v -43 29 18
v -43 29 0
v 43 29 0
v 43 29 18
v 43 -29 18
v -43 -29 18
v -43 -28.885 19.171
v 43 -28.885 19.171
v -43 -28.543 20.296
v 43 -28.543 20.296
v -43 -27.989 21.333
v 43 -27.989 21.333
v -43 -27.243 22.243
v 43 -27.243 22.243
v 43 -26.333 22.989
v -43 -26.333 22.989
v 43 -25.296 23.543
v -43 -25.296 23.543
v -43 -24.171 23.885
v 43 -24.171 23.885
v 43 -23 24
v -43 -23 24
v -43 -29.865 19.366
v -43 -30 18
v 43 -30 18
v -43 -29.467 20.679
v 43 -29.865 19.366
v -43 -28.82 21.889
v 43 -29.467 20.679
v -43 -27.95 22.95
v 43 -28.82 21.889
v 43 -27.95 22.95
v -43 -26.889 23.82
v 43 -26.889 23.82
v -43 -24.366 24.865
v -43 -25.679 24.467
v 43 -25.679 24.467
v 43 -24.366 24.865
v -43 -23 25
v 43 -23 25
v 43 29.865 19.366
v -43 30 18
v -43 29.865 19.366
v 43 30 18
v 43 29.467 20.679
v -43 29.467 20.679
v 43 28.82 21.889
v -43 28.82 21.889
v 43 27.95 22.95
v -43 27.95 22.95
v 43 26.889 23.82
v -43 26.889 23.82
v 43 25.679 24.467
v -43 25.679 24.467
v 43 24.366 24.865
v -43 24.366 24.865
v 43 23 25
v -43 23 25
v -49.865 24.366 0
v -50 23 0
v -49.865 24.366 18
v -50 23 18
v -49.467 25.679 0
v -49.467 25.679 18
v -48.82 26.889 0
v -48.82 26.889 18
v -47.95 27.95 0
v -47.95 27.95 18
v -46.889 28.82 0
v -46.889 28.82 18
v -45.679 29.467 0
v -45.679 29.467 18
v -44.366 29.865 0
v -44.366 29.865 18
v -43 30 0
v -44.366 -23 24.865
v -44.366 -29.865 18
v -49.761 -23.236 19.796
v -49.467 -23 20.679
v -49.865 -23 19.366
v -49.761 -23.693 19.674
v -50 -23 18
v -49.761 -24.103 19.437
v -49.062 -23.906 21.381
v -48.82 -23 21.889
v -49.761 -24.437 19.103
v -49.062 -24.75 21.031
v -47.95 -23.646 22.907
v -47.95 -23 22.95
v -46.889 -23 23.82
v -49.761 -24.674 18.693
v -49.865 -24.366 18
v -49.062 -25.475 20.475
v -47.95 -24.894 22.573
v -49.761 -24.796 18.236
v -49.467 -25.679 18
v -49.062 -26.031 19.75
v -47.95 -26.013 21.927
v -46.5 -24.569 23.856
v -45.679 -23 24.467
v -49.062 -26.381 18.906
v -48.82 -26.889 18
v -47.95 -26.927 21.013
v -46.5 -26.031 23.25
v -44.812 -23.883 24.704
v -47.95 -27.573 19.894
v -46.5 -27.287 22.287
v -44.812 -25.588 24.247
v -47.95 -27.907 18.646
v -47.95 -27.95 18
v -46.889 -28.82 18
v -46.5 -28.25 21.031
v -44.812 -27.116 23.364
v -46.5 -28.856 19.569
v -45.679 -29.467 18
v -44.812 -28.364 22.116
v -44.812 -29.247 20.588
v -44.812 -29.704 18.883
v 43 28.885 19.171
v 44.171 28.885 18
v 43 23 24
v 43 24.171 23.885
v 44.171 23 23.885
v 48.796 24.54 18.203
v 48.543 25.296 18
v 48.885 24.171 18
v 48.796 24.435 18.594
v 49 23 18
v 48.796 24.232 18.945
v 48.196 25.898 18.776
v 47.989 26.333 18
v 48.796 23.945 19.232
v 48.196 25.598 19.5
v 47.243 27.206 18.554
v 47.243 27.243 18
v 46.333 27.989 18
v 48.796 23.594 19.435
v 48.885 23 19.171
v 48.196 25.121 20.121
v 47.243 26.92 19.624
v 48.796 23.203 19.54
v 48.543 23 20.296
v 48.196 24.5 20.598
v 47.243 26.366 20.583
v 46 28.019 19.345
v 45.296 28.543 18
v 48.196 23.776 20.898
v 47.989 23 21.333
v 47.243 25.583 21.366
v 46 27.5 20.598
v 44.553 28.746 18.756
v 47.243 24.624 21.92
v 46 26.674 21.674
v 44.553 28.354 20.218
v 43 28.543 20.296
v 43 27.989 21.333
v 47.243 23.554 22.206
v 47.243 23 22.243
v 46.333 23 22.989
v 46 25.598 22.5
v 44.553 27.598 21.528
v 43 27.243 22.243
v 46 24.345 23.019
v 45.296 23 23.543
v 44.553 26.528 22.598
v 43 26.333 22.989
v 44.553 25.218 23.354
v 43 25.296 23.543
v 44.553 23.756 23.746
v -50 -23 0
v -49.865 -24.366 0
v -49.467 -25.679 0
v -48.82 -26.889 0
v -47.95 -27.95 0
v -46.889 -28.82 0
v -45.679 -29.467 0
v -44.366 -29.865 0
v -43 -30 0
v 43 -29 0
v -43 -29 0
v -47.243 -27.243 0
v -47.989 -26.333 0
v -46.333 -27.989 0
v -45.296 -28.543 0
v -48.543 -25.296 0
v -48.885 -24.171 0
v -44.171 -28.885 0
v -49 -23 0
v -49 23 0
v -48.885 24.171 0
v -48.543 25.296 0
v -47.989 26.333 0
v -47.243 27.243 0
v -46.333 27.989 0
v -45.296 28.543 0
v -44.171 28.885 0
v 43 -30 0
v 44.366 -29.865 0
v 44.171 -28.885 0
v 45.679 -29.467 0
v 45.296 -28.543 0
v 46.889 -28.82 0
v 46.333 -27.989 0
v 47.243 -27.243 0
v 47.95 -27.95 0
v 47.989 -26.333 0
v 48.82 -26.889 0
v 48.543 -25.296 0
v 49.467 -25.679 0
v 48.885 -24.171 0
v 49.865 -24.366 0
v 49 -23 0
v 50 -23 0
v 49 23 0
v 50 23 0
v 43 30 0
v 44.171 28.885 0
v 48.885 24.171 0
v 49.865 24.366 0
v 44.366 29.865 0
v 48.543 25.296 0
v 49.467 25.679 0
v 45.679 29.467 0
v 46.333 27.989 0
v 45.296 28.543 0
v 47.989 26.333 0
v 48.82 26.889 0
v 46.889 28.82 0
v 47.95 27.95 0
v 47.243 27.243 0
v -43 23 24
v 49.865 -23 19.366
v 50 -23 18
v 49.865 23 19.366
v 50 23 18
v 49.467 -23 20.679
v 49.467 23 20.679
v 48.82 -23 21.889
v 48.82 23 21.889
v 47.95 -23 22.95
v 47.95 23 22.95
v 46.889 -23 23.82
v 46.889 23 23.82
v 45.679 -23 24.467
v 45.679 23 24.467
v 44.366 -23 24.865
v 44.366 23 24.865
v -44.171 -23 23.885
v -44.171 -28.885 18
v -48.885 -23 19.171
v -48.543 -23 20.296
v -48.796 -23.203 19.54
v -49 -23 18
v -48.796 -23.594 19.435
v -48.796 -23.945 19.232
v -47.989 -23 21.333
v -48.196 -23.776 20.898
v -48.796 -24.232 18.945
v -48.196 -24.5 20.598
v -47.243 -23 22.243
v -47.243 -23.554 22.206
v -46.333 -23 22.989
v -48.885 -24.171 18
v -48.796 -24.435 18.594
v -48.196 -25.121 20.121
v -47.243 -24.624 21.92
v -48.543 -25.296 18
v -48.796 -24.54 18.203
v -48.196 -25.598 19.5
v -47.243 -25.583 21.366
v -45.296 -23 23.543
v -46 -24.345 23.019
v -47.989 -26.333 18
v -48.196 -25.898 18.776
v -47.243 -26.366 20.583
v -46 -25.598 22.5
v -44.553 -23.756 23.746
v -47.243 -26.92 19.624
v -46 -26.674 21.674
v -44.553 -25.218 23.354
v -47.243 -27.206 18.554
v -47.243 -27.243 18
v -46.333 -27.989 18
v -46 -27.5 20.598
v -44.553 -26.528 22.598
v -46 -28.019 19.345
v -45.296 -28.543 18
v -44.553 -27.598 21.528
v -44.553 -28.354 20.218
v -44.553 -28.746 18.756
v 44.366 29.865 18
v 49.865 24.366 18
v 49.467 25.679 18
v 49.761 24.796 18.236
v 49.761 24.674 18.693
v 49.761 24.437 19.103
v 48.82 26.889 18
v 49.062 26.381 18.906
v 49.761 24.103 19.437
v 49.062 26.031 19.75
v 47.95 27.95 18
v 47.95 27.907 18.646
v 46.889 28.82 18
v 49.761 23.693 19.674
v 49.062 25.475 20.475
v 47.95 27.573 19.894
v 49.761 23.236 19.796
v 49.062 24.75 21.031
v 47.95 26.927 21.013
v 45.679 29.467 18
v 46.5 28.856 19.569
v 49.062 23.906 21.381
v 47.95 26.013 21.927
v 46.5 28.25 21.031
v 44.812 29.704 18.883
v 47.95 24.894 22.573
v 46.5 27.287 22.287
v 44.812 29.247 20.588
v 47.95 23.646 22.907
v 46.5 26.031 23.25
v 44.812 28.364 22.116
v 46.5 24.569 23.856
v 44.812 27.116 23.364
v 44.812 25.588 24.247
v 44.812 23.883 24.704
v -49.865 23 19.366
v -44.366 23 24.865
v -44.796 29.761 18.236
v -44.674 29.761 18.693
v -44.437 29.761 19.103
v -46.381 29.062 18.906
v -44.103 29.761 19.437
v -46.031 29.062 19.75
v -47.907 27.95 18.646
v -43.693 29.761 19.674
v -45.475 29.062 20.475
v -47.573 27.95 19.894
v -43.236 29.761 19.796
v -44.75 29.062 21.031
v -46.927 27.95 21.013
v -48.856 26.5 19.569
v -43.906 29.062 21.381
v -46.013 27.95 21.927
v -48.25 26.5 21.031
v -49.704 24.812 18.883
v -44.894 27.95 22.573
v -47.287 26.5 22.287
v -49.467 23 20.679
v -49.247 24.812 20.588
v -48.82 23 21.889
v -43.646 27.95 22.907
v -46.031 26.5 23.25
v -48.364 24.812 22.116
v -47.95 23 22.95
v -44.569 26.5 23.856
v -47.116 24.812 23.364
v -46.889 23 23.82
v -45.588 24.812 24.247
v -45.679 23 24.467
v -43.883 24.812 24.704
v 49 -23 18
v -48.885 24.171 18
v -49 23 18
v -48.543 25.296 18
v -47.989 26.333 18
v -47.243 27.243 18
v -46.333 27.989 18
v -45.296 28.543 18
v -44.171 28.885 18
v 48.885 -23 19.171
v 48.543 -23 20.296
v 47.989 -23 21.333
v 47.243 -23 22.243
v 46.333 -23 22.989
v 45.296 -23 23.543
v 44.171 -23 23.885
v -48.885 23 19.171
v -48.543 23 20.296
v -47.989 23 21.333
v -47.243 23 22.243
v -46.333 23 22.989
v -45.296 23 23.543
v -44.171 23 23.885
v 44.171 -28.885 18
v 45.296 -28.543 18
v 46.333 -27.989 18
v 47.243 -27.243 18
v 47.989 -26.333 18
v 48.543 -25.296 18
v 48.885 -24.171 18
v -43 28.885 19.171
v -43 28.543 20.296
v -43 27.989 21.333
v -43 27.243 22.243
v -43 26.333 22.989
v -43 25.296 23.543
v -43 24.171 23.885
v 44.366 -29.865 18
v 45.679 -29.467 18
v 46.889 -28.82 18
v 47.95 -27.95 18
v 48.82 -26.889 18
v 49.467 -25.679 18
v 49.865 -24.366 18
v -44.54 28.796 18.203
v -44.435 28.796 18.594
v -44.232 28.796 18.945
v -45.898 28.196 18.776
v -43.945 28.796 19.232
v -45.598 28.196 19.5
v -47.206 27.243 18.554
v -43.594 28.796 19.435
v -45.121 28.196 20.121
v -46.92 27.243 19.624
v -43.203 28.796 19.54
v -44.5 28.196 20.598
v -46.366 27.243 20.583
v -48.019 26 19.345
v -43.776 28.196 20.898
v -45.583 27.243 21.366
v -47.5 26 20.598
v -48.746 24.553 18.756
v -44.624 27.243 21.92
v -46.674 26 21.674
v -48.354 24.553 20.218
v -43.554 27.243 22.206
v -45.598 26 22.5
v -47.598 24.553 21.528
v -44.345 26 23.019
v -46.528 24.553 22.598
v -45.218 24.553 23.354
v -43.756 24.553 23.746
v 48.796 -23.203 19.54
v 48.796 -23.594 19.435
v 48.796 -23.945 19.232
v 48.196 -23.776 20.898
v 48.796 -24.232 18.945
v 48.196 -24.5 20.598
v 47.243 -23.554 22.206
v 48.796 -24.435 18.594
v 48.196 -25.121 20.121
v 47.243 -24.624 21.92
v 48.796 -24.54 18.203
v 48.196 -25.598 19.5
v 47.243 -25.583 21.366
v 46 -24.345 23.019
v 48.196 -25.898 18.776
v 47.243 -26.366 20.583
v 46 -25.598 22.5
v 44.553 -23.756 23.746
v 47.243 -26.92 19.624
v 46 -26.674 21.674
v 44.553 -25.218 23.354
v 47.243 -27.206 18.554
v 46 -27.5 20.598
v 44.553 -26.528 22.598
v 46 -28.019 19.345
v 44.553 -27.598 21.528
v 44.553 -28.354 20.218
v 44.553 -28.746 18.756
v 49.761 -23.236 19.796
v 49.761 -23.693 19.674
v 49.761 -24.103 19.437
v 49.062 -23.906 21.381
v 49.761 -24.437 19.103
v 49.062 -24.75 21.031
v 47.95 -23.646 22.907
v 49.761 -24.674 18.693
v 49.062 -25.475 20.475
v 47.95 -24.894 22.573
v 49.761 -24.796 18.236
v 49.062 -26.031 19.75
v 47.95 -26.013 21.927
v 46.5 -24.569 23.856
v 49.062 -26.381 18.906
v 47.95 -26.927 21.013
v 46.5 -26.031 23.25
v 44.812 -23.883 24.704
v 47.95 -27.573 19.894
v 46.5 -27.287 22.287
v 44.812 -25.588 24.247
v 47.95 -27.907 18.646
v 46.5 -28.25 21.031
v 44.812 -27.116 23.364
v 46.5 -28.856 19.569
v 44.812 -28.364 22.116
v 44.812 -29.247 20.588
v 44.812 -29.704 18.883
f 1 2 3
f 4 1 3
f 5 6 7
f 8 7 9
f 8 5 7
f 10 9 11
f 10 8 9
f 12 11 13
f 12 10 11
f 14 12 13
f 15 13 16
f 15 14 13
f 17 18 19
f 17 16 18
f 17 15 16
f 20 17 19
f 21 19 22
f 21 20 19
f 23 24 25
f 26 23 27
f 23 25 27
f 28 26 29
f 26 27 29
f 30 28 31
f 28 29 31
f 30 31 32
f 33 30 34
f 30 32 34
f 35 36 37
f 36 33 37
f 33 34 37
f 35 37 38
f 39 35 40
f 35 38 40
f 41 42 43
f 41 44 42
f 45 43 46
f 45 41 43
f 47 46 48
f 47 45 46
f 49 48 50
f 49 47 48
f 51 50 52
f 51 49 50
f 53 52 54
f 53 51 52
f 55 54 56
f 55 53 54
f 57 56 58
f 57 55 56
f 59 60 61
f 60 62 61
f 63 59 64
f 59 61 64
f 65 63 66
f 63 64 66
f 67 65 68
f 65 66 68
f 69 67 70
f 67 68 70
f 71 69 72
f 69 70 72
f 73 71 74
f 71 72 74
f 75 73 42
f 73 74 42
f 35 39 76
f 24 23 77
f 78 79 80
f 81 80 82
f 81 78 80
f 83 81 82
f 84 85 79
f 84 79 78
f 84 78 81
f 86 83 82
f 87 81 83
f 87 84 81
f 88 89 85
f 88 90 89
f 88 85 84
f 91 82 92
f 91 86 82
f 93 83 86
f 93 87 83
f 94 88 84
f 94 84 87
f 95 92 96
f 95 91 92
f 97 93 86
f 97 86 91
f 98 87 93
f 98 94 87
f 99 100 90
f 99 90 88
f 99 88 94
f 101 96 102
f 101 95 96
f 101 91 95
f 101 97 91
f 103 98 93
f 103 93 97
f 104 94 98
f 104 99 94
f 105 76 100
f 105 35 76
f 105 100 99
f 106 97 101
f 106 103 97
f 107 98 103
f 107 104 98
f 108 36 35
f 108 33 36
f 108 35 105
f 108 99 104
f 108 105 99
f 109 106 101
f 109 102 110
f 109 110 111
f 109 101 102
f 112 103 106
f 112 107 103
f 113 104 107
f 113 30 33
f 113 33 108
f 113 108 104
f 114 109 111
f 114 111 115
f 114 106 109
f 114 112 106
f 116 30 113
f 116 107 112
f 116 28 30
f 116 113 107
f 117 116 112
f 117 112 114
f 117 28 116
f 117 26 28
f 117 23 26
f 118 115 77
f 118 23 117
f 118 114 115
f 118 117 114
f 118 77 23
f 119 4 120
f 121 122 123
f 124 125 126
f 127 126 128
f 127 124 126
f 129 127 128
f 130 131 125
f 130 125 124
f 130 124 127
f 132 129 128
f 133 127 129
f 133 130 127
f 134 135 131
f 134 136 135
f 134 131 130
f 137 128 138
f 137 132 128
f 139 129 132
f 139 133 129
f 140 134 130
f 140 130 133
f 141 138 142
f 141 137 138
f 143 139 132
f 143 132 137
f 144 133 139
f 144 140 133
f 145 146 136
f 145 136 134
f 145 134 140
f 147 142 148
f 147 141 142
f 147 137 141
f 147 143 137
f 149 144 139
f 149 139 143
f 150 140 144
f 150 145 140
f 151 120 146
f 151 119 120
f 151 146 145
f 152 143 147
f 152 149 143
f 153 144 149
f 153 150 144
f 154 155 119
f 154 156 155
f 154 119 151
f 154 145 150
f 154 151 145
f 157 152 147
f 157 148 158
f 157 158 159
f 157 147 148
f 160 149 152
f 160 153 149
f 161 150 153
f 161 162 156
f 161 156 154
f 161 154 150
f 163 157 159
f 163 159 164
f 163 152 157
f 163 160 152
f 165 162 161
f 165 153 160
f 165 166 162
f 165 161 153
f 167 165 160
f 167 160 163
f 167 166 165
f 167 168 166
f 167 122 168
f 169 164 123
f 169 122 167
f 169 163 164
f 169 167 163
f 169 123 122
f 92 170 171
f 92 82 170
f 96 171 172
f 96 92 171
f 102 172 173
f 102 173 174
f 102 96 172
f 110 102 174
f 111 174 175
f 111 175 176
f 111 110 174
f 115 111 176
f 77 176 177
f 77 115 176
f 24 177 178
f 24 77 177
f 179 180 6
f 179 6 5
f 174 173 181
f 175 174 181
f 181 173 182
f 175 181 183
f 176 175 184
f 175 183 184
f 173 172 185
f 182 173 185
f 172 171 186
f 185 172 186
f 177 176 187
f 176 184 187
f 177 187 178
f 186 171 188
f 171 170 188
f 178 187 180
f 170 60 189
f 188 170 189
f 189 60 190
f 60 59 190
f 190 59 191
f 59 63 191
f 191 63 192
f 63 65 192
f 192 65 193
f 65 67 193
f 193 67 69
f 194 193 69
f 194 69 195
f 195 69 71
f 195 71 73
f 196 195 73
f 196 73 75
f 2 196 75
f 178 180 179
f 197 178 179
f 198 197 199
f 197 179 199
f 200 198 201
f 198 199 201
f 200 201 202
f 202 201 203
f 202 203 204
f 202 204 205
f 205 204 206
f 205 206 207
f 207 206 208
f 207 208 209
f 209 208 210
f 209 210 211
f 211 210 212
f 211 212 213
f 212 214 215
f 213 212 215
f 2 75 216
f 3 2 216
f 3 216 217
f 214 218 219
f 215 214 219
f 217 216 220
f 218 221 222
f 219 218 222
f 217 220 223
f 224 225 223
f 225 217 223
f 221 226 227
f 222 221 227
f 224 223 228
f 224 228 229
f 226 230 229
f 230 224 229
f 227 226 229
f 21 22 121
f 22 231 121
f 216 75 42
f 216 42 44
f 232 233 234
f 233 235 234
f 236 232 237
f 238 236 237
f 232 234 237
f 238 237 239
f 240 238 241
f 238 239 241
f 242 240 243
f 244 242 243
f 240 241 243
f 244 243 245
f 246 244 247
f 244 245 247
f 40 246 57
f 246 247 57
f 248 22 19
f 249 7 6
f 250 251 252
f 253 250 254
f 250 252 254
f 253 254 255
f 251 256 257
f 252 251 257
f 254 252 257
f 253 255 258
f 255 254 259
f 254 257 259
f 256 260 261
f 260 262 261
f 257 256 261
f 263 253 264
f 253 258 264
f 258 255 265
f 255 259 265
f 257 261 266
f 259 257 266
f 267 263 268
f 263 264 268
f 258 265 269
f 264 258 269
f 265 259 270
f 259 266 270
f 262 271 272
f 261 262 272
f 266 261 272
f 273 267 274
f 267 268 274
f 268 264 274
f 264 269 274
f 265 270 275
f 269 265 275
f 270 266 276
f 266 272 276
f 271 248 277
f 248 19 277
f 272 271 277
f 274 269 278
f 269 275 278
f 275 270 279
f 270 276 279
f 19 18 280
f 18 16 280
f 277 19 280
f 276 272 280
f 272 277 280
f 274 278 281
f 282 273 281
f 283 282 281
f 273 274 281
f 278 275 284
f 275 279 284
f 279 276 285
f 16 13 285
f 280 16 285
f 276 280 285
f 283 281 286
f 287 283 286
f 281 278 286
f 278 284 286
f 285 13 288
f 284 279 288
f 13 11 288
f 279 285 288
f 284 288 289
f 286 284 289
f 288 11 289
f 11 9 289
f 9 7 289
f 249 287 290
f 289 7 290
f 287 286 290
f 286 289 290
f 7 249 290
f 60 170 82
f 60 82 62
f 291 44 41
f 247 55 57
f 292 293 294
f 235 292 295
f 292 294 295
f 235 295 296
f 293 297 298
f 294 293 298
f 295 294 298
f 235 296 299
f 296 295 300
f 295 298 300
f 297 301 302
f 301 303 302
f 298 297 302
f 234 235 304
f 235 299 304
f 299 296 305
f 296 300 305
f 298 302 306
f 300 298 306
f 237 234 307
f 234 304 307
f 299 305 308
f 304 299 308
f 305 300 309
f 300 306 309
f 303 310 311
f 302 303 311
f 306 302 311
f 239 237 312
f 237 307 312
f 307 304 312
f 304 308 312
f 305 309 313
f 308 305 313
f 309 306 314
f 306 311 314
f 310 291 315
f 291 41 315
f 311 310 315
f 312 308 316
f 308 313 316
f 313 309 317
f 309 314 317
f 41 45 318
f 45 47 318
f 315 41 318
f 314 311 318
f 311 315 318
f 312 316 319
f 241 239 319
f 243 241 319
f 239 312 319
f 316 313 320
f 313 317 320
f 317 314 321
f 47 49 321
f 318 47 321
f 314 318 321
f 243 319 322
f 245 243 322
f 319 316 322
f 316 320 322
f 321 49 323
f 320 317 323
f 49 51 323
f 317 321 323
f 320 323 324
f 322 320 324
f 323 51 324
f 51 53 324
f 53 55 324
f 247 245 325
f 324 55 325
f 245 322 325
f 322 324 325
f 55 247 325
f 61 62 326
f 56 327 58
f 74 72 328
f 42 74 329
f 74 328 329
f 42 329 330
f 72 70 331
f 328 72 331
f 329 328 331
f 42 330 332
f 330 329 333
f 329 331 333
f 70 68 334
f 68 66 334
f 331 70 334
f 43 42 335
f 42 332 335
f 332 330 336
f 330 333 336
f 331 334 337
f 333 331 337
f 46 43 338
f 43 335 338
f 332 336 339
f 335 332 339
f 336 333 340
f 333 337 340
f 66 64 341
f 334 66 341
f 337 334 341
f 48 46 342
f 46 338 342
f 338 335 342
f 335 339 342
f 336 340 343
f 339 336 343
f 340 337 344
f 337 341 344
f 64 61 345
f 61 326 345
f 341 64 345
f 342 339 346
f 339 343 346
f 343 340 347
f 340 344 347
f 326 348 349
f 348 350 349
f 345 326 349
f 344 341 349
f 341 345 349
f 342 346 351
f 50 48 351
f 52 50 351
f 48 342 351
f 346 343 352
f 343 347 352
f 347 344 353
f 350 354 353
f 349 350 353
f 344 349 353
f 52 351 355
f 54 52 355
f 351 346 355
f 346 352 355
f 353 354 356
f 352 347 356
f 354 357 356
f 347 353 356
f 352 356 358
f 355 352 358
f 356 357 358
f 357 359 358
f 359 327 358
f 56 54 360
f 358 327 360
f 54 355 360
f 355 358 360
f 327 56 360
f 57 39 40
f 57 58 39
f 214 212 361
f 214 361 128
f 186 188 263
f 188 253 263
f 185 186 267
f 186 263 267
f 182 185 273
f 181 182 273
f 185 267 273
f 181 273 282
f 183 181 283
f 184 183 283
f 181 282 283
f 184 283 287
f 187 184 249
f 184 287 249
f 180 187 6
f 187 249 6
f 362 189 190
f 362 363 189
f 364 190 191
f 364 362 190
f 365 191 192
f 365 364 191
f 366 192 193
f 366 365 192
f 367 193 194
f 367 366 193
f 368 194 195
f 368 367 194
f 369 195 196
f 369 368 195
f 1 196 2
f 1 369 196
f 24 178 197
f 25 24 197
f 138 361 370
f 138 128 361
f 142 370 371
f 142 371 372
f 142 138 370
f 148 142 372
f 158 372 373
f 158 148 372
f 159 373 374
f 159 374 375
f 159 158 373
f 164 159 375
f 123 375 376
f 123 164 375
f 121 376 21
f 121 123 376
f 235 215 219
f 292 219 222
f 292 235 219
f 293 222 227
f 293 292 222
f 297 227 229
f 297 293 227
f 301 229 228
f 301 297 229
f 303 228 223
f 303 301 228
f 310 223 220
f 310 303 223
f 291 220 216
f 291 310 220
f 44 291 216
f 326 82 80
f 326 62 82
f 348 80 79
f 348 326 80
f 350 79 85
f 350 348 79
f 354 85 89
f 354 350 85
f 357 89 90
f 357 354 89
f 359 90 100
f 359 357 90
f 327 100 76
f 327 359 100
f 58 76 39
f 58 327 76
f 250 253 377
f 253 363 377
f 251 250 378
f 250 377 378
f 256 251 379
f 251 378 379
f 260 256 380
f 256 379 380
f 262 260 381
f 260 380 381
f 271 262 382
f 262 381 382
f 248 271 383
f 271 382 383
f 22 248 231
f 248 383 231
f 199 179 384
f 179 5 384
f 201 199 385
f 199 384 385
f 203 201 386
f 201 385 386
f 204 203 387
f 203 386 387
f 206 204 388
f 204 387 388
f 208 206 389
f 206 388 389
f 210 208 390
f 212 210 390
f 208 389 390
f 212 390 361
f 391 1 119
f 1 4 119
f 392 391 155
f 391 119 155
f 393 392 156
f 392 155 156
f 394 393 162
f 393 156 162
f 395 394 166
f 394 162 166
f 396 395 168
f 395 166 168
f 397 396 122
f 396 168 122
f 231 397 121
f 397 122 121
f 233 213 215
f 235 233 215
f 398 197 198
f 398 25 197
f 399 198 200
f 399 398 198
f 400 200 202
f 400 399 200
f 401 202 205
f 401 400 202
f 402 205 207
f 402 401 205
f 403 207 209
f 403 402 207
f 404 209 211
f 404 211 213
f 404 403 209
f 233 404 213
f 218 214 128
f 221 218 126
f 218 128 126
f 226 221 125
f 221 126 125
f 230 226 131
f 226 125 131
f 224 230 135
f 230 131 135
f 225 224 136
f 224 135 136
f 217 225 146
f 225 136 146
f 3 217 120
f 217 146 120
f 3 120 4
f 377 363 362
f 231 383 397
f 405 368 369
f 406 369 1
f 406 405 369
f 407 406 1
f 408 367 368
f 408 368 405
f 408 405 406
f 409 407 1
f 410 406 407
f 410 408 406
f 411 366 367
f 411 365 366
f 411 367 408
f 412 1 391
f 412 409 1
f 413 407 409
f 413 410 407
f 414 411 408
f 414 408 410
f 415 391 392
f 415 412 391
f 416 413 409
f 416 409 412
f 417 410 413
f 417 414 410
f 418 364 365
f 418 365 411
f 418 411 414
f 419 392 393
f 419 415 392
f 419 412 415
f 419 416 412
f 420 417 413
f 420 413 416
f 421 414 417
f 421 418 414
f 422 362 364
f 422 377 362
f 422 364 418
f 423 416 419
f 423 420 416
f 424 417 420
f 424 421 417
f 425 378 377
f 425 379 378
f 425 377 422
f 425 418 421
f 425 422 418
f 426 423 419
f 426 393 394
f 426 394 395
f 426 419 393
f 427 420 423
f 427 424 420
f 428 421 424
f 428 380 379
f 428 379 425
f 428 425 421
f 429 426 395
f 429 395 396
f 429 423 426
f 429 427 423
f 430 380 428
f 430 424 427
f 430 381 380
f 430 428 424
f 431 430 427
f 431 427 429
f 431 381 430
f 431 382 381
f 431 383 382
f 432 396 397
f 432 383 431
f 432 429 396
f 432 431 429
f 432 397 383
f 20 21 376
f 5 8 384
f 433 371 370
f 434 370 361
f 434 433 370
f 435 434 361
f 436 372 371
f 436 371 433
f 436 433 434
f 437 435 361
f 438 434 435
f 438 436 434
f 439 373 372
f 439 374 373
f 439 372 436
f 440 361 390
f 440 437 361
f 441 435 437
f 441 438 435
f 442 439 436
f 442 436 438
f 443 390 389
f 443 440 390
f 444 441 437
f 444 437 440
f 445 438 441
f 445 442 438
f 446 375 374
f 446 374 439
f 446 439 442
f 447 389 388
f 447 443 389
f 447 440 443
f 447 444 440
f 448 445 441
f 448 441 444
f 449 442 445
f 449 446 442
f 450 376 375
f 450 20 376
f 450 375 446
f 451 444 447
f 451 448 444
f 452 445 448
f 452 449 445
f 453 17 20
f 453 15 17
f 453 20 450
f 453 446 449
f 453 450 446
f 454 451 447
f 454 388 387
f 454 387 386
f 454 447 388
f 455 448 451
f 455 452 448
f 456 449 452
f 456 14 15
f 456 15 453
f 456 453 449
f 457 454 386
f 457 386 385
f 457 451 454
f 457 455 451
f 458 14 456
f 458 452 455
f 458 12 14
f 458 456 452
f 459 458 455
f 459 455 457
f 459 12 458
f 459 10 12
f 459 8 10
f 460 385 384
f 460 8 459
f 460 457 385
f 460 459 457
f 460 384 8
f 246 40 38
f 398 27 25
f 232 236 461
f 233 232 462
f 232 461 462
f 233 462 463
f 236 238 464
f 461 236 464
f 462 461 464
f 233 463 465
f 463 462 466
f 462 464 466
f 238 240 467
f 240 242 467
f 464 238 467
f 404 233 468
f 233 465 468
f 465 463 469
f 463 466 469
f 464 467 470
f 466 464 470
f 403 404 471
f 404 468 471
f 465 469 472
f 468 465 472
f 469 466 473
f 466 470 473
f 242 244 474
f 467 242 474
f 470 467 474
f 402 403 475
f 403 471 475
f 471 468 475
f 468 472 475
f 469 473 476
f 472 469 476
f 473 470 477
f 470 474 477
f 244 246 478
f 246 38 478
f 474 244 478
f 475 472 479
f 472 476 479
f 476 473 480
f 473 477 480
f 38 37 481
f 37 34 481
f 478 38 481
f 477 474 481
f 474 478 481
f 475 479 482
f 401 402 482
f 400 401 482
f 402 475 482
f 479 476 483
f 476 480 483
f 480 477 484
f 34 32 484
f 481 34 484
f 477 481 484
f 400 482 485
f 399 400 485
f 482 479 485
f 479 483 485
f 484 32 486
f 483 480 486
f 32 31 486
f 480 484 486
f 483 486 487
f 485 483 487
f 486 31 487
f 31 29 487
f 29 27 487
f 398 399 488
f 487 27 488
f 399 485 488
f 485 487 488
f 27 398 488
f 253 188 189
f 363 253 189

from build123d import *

# Parameters (mm, degrees)
F0_W     = 100
F0_H     = 60
F1_DEPTH = 25
F2_R     = 7
F3_T     = -1


with BuildPart() as f1:
    # F0 (on Top) → F1 (new body)
    with BuildSketch(Plane.XY):
        Rectangle(F0_W, F0_H)
    extrude(amount=F1_DEPTH)

    # F2
    f2_edges = [f1.edges().sort_by_distance(p)[0] for p in [
        (0, -30, 25),
        (-50, 0, 25),
        (-50, -30, 12.5),
        (-50, 30, 12.5),
        (0, 30, 25),
        (50, 30, 12.5),
        (50, 0, 25),
        (50, -30, 12.5),
    ]]
    fillet(f2_edges, radius=F2_R)

    # F3
    f3_openings = [f1.faces().sort_by_distance(p)[0] for p in [
        (0, 0, 0),
    ]]
    offset(amount=F3_T, openings=f3_openings)


solid = f1.part
